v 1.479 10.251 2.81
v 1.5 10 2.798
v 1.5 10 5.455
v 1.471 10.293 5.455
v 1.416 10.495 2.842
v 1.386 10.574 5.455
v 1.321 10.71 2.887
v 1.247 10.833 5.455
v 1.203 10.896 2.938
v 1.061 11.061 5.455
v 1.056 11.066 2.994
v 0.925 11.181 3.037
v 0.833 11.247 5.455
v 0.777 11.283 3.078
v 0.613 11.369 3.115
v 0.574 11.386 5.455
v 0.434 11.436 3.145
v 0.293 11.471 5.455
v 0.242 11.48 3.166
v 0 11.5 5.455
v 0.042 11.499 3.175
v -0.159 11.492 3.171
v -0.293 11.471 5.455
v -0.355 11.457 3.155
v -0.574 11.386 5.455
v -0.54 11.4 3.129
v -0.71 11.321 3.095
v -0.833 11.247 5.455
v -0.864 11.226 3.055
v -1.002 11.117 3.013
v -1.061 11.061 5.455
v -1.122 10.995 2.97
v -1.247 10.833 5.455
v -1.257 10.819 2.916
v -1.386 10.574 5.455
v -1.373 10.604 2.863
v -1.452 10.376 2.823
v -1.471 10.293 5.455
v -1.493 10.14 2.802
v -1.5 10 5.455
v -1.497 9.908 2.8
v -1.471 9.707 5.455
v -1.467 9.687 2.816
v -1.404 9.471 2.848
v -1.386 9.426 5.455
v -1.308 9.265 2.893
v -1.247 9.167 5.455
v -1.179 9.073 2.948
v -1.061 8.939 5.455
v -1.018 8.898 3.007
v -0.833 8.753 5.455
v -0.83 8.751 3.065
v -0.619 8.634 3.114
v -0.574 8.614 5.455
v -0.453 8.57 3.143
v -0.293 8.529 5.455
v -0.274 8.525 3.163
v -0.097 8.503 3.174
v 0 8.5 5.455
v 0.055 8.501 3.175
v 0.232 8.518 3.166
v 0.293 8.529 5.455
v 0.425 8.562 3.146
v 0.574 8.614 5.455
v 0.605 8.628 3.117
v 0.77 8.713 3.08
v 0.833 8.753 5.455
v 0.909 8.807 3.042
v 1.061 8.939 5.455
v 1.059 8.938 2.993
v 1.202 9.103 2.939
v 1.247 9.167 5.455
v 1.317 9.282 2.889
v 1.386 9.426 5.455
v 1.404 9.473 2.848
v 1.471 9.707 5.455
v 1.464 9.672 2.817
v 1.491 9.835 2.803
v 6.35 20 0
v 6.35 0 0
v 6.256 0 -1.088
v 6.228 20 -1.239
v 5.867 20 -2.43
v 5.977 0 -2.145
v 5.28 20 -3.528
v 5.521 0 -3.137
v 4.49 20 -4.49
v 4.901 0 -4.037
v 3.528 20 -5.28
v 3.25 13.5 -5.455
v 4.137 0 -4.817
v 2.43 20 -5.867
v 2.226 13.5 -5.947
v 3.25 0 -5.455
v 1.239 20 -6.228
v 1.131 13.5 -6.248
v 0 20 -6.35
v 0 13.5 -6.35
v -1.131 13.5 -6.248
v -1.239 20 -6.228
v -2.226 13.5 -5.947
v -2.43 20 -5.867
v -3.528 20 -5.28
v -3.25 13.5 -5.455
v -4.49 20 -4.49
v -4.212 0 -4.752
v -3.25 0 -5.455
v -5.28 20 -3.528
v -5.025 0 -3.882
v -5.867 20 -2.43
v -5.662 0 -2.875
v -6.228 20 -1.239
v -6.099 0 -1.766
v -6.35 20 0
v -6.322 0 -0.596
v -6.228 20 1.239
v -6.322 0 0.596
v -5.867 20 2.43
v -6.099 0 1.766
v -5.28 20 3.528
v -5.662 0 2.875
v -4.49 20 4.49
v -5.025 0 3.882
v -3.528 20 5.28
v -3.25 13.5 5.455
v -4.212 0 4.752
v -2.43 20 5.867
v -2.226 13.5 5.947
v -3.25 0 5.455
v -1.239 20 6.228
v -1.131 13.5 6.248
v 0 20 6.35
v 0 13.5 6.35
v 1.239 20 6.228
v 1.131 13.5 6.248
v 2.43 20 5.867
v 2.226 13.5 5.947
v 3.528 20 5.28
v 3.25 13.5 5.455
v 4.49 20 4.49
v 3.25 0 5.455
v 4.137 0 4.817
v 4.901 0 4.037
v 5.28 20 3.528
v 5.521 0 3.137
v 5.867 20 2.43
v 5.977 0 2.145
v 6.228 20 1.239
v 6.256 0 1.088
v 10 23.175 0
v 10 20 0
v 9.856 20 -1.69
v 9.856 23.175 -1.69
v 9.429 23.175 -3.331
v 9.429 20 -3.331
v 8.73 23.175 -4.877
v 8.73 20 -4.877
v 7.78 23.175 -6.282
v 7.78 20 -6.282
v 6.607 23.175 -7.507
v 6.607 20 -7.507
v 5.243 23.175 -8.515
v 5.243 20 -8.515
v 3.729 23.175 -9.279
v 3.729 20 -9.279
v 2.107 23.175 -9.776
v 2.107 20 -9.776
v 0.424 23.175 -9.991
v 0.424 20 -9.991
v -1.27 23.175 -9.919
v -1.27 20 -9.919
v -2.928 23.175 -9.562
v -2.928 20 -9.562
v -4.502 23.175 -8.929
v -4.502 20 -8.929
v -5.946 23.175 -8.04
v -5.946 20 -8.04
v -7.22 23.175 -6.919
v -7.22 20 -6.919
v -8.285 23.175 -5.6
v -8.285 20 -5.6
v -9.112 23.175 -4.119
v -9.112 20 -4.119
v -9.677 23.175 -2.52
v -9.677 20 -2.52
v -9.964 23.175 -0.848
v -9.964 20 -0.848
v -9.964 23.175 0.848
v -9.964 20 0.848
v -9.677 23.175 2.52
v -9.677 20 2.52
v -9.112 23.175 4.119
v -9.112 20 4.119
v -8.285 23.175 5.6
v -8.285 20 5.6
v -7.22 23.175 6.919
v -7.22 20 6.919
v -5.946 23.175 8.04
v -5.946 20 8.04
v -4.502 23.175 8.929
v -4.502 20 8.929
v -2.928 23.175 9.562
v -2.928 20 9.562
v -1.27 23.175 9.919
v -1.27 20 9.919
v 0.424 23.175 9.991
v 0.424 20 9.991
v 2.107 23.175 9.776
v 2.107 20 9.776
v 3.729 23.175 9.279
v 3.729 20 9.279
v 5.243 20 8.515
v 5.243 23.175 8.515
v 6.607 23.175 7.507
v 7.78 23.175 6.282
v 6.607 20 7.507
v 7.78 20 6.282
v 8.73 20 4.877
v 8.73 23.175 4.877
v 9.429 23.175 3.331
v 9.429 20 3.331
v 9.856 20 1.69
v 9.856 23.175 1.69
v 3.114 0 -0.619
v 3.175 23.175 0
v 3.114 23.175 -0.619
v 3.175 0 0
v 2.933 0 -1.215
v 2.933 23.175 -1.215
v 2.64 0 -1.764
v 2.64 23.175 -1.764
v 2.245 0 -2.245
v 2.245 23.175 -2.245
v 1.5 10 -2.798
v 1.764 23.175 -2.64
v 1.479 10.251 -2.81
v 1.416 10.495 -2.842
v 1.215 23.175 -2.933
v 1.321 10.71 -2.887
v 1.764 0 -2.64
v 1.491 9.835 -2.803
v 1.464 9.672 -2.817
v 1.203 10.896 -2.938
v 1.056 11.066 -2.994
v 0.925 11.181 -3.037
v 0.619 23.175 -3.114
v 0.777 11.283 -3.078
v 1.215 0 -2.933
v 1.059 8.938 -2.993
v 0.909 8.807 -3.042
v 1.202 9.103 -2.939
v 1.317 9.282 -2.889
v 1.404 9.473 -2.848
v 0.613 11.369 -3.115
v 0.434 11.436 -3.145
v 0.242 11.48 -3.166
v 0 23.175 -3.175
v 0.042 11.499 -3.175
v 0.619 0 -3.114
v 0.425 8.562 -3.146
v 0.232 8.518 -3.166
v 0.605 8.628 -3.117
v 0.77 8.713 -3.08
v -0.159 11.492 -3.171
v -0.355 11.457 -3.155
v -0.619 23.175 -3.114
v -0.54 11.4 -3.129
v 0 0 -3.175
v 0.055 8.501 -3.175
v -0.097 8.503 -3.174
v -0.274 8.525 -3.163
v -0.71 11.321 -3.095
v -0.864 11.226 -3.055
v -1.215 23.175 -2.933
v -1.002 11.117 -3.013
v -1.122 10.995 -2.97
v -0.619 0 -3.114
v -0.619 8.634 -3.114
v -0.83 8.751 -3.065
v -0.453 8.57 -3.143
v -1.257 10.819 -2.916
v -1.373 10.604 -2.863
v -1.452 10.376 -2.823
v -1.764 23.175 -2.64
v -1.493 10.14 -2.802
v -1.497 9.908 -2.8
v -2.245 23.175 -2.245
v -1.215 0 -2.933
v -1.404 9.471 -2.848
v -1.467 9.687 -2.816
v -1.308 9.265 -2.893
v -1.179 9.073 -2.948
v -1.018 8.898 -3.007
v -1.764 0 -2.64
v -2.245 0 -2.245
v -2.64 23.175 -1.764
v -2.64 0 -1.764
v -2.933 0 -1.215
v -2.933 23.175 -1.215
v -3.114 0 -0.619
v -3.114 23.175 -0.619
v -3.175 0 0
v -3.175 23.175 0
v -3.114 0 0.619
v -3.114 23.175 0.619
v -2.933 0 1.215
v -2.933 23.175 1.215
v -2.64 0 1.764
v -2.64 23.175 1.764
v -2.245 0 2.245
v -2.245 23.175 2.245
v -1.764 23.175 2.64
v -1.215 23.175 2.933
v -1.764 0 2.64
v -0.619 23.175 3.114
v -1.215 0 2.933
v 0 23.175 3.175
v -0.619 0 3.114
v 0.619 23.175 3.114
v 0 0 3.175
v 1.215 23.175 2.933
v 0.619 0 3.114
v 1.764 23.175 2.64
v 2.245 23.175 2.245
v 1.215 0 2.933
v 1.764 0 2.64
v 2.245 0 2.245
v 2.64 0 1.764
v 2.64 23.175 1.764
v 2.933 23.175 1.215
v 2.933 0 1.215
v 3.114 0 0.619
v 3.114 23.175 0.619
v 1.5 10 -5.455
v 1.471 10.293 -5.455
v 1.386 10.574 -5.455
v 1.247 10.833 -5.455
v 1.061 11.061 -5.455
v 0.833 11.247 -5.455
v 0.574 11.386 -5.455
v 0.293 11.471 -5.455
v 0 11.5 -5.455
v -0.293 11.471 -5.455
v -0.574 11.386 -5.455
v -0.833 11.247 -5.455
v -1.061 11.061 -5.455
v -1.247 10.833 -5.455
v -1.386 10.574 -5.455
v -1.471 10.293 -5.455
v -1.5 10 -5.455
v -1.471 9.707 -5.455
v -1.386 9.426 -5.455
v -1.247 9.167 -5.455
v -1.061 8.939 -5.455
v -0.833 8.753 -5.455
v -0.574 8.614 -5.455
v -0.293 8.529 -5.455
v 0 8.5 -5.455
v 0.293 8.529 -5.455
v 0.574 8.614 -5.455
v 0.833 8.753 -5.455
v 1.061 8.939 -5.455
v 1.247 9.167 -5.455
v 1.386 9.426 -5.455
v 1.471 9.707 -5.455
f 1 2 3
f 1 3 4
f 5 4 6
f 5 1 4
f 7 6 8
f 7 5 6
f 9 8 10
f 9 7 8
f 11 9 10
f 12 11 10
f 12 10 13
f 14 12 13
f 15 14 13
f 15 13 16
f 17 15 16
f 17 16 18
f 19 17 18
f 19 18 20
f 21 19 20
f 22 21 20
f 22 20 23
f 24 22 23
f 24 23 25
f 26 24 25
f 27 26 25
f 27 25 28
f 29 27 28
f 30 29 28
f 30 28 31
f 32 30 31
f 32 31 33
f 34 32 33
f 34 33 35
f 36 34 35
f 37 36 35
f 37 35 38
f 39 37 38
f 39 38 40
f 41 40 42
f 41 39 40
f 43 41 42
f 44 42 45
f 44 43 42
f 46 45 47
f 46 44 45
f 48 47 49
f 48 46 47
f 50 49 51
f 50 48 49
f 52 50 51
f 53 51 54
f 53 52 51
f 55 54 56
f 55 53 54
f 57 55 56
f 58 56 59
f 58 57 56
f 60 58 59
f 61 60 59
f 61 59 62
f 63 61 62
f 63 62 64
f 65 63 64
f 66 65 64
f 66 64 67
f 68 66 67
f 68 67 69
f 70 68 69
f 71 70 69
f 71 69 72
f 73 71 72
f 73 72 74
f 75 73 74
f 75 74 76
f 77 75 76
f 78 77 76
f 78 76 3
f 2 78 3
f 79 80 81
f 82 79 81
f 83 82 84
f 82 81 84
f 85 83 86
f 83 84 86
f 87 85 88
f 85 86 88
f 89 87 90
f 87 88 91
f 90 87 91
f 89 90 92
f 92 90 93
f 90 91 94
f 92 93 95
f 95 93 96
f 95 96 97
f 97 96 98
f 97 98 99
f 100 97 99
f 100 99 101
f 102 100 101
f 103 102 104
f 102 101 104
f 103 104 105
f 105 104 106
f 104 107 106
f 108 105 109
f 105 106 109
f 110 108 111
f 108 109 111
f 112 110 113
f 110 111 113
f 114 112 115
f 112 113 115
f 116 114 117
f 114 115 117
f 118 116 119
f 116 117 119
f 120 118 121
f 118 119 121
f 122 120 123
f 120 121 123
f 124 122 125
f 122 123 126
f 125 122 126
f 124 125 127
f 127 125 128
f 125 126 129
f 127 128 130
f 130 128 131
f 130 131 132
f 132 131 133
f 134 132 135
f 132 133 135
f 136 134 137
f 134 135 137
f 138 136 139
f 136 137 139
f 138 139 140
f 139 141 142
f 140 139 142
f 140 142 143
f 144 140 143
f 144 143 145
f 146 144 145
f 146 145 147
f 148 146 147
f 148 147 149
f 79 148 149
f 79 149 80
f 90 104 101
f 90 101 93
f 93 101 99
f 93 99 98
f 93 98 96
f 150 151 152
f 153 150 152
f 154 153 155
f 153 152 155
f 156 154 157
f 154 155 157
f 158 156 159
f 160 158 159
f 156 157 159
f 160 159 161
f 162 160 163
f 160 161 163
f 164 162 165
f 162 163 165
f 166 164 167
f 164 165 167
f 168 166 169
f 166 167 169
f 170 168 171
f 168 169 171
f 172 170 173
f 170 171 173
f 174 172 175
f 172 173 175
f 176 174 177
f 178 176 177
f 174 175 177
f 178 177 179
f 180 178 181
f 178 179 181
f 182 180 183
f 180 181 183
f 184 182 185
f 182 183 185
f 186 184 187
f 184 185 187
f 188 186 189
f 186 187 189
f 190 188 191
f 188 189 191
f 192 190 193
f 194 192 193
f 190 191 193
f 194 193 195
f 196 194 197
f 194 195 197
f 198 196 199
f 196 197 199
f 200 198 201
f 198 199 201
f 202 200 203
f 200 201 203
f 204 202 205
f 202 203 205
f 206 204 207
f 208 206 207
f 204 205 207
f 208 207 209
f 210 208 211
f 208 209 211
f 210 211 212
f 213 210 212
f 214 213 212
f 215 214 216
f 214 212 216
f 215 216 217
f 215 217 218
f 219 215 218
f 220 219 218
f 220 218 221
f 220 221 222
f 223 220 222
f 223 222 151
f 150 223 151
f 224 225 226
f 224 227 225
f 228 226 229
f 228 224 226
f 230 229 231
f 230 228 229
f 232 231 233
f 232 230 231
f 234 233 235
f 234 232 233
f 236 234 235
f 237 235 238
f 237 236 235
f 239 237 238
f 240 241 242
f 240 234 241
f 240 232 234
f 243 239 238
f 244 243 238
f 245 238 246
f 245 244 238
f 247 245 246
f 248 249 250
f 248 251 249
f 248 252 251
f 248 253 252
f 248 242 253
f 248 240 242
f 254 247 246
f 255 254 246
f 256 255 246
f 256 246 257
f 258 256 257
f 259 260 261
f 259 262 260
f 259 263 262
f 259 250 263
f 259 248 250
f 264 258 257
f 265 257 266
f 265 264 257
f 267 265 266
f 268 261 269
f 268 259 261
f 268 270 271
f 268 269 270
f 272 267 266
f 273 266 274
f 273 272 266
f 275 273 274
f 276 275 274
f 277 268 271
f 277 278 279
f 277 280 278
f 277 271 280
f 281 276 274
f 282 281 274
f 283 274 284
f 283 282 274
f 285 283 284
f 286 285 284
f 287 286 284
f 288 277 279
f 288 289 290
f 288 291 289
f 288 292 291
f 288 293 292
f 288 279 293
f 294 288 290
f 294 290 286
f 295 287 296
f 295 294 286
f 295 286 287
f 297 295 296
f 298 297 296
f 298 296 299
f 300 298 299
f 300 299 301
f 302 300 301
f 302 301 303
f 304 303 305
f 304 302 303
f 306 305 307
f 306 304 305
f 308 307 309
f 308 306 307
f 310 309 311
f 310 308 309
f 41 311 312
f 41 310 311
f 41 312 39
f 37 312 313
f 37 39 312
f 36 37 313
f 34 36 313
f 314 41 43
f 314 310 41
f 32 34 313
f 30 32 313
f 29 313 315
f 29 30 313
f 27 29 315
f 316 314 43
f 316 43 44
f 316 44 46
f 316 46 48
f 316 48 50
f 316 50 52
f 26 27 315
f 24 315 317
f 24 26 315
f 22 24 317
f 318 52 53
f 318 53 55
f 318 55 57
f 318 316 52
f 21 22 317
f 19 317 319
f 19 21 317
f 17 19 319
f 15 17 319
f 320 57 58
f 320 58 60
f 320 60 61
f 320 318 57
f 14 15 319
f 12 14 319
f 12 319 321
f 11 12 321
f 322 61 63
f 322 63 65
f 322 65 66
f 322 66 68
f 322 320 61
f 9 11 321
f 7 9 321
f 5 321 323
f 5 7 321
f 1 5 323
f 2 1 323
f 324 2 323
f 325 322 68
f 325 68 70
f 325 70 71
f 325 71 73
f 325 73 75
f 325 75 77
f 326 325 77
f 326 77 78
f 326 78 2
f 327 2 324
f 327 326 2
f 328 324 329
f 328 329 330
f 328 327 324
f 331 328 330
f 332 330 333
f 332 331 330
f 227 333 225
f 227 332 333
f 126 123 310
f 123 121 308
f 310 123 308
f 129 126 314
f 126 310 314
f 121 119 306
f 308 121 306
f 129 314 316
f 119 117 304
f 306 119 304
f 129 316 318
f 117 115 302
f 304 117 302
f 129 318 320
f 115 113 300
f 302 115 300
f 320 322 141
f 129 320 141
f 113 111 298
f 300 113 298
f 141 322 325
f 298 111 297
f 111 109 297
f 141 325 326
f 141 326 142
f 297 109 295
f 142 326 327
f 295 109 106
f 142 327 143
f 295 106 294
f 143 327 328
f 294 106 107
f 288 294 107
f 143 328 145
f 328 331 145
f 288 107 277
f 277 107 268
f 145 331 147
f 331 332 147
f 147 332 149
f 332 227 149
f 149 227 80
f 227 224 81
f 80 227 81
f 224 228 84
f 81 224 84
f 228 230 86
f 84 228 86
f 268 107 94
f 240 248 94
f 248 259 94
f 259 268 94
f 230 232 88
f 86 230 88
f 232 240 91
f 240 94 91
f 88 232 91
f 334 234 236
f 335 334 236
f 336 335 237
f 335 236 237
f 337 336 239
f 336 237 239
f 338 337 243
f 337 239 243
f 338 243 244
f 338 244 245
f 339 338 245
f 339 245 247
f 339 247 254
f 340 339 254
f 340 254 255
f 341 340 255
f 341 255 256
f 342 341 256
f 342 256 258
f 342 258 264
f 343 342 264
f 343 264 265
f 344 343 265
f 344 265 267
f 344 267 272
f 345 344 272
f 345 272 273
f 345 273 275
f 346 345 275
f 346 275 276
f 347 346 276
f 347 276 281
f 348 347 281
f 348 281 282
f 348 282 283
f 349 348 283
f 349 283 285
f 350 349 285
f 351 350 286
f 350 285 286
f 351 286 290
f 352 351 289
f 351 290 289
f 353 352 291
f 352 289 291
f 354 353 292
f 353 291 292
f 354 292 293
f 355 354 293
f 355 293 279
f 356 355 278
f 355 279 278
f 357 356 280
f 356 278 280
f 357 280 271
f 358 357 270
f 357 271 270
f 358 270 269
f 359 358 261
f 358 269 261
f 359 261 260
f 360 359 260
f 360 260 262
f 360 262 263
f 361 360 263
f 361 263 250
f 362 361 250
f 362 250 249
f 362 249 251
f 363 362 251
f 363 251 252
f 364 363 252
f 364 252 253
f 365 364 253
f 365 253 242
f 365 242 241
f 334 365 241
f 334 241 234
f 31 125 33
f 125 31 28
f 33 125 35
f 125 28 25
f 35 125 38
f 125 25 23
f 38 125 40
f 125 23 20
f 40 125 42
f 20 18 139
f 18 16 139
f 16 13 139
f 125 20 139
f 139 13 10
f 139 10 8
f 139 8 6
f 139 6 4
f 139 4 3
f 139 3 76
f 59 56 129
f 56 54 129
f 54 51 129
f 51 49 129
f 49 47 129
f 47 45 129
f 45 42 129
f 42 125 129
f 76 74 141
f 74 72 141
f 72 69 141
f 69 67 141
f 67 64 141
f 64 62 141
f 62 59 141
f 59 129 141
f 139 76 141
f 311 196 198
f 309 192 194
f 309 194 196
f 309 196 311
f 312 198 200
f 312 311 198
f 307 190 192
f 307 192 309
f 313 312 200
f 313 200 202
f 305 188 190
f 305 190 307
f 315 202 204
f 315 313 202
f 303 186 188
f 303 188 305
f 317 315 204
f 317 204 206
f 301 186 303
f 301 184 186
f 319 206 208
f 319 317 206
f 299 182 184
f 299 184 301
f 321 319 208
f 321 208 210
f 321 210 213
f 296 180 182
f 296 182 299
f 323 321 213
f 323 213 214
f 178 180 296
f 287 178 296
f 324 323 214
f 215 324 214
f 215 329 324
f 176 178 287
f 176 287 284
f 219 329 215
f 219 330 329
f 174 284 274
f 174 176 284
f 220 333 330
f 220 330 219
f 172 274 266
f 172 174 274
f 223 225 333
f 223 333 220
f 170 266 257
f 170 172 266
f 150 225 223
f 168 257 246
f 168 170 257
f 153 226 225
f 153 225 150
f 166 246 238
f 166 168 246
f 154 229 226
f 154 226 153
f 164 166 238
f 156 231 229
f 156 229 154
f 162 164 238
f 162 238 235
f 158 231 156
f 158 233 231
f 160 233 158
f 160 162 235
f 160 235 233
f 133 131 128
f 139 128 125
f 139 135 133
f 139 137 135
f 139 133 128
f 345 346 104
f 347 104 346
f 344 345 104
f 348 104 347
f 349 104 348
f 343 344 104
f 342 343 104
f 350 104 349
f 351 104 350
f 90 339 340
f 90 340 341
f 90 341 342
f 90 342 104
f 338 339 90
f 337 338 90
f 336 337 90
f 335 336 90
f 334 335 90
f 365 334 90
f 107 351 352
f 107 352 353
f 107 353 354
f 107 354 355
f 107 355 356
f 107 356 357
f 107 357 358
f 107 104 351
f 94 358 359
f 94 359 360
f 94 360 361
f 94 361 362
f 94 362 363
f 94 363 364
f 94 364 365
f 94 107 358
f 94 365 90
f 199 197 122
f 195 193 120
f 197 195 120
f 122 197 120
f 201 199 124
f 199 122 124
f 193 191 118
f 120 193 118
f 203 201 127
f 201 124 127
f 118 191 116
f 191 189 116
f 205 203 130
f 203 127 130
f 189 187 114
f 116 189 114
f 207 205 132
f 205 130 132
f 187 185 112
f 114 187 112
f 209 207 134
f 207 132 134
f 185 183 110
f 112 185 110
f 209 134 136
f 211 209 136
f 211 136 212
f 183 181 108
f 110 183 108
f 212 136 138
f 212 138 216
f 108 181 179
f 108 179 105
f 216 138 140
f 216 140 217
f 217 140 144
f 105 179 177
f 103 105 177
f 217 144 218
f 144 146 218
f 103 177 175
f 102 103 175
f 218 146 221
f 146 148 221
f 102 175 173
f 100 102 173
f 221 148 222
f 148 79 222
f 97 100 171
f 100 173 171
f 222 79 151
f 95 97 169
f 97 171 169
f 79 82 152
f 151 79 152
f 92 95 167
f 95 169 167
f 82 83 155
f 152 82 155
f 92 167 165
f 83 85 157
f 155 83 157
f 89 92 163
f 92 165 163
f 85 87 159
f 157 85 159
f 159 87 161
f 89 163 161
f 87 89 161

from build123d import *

# Parameters (mm, degrees)
SKETCH1_R               = 6.35
SKETCH1_R_2             = 3.175
BOSS_EXTRUDE1_DEPTH     = 20
SKETCH2_R               = 10
SKETCH2_R_2             = 3.175
BOSS_EXTRUDE2_DEPTH     = 3.175
SKETCH3_R               = 1.5
CUT_EXTRUDE1_DEPTH      = 10
CUT_EXTRUDE1_DEPTH_BACK = 11
SKETCH4_W               = 6.5
SKETCH4_H               = 0.894727321
CUT_EXTRUDE2_DEPTH      = 13.5


with BuildPart() as part:
    # Sketch1 → Boss-Extrude1 (new body)
    with BuildSketch(Plane(origin=(0, 0, 0), x_dir=(1, 0, 0), z_dir=(0, 1, 0))):
        Circle(SKETCH1_R)
        Circle(SKETCH1_R_2, mode=Mode.SUBTRACT)
    extrude(amount=BOSS_EXTRUDE1_DEPTH)

    # Sketch2 → Boss-Extrude2 (add)
    with BuildSketch(Plane(origin=(0, 20, 0), x_dir=(1, 0, 0), z_dir=(0, 1, 0))):
        Circle(SKETCH2_R)
        Circle(SKETCH2_R_2, mode=Mode.SUBTRACT)
    extrude(amount=BOSS_EXTRUDE2_DEPTH)

    # Sketch3 → Cut-Extrude1 (cut, two sides)
    with BuildSketch(Plane.XY) as cut_extrude1_sk:
        with Locations((0, 10)):
            Circle(SKETCH3_R)
    extrude(amount=CUT_EXTRUDE1_DEPTH, mode=Mode.SUBTRACT)
    extrude(cut_extrude1_sk.sketch, amount=-CUT_EXTRUDE1_DEPTH_BACK, mode=Mode.SUBTRACT)

    # Sketch4 → Cut-Extrude2 (cut)
    with BuildSketch(Plane.XZ):
        with Locations((0, -5.90263634)):
            Rectangle(SKETCH4_W, SKETCH4_H)
        with Locations((0, 5.90263634)):
            Rectangle(SKETCH4_W, SKETCH4_H)
    extrude(amount=-CUT_EXTRUDE2_DEPTH, mode=Mode.SUBTRACT)


solid = part.part
